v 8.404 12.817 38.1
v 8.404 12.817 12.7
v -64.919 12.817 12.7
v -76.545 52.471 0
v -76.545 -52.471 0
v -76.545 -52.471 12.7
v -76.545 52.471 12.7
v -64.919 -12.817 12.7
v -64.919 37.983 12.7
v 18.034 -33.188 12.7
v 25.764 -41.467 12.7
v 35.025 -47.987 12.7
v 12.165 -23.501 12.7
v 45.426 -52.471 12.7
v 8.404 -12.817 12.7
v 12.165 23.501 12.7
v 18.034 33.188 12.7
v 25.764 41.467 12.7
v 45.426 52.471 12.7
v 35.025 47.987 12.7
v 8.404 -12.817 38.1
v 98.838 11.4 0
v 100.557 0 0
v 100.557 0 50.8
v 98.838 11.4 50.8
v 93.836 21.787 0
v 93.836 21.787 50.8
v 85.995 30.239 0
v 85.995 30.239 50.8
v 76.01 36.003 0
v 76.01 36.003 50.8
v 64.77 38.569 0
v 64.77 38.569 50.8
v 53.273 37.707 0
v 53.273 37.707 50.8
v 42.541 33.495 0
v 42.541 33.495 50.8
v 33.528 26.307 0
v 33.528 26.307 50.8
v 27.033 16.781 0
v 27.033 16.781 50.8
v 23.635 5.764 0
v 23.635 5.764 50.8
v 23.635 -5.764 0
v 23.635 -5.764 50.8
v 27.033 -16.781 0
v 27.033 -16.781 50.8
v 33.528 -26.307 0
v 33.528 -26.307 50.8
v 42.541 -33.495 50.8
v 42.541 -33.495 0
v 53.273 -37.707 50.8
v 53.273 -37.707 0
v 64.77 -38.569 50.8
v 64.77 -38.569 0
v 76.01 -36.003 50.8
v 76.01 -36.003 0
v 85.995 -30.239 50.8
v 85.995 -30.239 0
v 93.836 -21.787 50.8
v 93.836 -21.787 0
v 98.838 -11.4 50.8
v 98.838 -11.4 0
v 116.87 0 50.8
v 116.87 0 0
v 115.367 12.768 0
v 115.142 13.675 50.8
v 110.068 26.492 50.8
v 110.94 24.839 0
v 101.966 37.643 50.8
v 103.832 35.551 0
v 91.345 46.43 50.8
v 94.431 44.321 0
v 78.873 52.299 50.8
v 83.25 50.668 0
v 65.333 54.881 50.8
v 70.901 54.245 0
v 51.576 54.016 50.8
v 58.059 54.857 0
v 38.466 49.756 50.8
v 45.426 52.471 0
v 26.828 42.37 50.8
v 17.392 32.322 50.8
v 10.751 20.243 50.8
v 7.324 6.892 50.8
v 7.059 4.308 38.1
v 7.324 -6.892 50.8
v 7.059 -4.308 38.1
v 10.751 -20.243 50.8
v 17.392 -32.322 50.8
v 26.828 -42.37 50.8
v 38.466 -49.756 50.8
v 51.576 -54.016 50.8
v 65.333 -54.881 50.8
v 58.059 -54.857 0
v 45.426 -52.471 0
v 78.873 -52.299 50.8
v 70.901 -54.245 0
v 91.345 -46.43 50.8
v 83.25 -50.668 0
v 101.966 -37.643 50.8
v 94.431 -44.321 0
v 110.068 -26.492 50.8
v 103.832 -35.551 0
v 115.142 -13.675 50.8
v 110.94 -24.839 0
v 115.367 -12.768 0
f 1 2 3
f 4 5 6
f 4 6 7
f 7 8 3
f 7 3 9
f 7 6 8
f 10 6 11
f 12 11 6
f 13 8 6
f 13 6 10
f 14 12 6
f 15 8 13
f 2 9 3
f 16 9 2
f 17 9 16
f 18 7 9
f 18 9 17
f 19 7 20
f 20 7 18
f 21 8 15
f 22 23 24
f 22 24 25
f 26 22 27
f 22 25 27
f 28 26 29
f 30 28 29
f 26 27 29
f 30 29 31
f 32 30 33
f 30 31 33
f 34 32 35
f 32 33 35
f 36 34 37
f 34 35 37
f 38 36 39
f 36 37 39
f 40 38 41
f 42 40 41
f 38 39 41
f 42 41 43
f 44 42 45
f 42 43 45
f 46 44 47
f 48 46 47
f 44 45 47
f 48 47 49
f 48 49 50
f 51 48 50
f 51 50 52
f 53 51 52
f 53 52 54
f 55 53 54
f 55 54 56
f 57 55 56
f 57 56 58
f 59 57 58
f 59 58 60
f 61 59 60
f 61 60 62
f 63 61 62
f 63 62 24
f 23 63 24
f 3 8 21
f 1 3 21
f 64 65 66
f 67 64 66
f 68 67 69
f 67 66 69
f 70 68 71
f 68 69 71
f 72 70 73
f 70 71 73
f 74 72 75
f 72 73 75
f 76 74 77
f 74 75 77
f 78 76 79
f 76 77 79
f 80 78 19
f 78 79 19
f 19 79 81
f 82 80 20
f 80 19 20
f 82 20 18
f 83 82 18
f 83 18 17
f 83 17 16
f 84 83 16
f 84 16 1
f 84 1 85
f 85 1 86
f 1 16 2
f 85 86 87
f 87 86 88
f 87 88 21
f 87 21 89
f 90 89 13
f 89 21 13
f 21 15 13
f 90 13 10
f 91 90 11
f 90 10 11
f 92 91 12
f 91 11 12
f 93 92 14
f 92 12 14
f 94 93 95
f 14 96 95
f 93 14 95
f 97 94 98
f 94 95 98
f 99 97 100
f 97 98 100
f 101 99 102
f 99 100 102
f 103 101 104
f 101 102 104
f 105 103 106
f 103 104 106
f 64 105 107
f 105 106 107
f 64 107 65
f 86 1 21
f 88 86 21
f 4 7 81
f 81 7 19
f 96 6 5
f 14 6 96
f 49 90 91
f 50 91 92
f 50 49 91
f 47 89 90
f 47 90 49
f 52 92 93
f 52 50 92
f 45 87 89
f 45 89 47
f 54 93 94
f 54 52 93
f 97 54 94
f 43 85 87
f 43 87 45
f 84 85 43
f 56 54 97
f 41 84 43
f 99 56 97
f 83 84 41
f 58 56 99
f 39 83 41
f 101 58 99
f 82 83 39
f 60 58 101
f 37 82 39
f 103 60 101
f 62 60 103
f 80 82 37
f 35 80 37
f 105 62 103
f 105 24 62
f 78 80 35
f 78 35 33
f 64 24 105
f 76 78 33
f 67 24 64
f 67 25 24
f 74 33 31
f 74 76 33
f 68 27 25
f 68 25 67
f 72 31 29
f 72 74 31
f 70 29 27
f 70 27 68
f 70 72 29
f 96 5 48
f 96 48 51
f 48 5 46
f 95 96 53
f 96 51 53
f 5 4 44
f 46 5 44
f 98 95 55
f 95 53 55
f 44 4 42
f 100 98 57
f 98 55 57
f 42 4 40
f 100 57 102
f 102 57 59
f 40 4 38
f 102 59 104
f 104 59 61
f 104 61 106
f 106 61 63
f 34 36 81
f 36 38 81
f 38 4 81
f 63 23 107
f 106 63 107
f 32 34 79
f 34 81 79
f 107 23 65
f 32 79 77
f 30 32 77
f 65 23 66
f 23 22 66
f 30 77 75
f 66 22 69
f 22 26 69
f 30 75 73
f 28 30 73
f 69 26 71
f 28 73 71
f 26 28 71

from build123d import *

# Parameters (mm, degrees)
F0_W      = 121.971261
F0_H      = 116.605956
F1_DEPTH  = 12.7
F2_R      = 54.989942
F3_DEPTH  = 50.8
F4_R      = 38.676946
F5_DEPTH  = 101.6
F7_DEPTH  = 25.4
F9_DEPTH  = 50.8
F10_W     = 121.971261
F10_H     = 6.011137
F11_DEPTH = 25.4
F12_W     = 121.971261
F12_H     = 5.653453
F13_DEPTH = 25.4


with BuildPart() as f1:
    # F0 (on Top) → F1 (new body)
    with BuildSketch(Plane.XY):
        with Locations((-15.559384, -0.178842)):
            Rectangle(F0_W, F0_H)
    extrude(amount=F1_DEPTH)

    # F2 (on Top) → F3 (join)
    with BuildSketch(Plane.XY):
        with Locations((61.879851, 0)):
            Circle(F2_R)
    extrude(amount=F3_DEPTH)

    # F4 (on face) → F5 (cut)
    with BuildSketch(Plane.XY.offset(50.8)):
        with Locations((61.879851, 0)):
            Circle(F4_R)
    extrude(amount=-F5_DEPTH, mode=Mode.SUBTRACT)

    # F6 (on face) → F7 (join)
    with BuildSketch(Plane.XY.offset(12.7)):
        with BuildLine():
            ThreePointArc((8.404423, -12.816874), (6.889909, 0), (8.404423, 12.816874))
            Line((8.404423, 12.816874), (-64.918965, 12.816874))
            Line((-64.918965, 12.816874), (-64.918965, -12.816874))
            Line((-64.918965, -12.816874), (8.404423, -12.816874))
        make_face()
    extrude(amount=F7_DEPTH)

    # F8 (on face) → F9 (cut)
    with BuildSketch(Plane.XZ.offset(12.816874)):
        Polygon((-64.918965, 12.7), (8.404423, 38.1), (-64.918965, 38.1), align=None)
    extrude(amount=-F9_DEPTH, mode=Mode.SUBTRACT)

    # F10 (on face) → F11 (cut)
    with BuildSketch(Plane.XY.offset(12.7)):
        with Locations((-15.559384, -55.476252)):
            Rectangle(F10_W, F10_H)
    extrude(amount=-F11_DEPTH, mode=Mode.SUBTRACT)

    # F12 (on face) → F13 (cut)
    with BuildSketch(Plane.XY.offset(12.7)):
        with Locations((-15.559384, 55.29741)):
            Rectangle(F12_W, F12_H)
    extrude(amount=-F13_DEPTH, mode=Mode.SUBTRACT)


solid = f1.part
